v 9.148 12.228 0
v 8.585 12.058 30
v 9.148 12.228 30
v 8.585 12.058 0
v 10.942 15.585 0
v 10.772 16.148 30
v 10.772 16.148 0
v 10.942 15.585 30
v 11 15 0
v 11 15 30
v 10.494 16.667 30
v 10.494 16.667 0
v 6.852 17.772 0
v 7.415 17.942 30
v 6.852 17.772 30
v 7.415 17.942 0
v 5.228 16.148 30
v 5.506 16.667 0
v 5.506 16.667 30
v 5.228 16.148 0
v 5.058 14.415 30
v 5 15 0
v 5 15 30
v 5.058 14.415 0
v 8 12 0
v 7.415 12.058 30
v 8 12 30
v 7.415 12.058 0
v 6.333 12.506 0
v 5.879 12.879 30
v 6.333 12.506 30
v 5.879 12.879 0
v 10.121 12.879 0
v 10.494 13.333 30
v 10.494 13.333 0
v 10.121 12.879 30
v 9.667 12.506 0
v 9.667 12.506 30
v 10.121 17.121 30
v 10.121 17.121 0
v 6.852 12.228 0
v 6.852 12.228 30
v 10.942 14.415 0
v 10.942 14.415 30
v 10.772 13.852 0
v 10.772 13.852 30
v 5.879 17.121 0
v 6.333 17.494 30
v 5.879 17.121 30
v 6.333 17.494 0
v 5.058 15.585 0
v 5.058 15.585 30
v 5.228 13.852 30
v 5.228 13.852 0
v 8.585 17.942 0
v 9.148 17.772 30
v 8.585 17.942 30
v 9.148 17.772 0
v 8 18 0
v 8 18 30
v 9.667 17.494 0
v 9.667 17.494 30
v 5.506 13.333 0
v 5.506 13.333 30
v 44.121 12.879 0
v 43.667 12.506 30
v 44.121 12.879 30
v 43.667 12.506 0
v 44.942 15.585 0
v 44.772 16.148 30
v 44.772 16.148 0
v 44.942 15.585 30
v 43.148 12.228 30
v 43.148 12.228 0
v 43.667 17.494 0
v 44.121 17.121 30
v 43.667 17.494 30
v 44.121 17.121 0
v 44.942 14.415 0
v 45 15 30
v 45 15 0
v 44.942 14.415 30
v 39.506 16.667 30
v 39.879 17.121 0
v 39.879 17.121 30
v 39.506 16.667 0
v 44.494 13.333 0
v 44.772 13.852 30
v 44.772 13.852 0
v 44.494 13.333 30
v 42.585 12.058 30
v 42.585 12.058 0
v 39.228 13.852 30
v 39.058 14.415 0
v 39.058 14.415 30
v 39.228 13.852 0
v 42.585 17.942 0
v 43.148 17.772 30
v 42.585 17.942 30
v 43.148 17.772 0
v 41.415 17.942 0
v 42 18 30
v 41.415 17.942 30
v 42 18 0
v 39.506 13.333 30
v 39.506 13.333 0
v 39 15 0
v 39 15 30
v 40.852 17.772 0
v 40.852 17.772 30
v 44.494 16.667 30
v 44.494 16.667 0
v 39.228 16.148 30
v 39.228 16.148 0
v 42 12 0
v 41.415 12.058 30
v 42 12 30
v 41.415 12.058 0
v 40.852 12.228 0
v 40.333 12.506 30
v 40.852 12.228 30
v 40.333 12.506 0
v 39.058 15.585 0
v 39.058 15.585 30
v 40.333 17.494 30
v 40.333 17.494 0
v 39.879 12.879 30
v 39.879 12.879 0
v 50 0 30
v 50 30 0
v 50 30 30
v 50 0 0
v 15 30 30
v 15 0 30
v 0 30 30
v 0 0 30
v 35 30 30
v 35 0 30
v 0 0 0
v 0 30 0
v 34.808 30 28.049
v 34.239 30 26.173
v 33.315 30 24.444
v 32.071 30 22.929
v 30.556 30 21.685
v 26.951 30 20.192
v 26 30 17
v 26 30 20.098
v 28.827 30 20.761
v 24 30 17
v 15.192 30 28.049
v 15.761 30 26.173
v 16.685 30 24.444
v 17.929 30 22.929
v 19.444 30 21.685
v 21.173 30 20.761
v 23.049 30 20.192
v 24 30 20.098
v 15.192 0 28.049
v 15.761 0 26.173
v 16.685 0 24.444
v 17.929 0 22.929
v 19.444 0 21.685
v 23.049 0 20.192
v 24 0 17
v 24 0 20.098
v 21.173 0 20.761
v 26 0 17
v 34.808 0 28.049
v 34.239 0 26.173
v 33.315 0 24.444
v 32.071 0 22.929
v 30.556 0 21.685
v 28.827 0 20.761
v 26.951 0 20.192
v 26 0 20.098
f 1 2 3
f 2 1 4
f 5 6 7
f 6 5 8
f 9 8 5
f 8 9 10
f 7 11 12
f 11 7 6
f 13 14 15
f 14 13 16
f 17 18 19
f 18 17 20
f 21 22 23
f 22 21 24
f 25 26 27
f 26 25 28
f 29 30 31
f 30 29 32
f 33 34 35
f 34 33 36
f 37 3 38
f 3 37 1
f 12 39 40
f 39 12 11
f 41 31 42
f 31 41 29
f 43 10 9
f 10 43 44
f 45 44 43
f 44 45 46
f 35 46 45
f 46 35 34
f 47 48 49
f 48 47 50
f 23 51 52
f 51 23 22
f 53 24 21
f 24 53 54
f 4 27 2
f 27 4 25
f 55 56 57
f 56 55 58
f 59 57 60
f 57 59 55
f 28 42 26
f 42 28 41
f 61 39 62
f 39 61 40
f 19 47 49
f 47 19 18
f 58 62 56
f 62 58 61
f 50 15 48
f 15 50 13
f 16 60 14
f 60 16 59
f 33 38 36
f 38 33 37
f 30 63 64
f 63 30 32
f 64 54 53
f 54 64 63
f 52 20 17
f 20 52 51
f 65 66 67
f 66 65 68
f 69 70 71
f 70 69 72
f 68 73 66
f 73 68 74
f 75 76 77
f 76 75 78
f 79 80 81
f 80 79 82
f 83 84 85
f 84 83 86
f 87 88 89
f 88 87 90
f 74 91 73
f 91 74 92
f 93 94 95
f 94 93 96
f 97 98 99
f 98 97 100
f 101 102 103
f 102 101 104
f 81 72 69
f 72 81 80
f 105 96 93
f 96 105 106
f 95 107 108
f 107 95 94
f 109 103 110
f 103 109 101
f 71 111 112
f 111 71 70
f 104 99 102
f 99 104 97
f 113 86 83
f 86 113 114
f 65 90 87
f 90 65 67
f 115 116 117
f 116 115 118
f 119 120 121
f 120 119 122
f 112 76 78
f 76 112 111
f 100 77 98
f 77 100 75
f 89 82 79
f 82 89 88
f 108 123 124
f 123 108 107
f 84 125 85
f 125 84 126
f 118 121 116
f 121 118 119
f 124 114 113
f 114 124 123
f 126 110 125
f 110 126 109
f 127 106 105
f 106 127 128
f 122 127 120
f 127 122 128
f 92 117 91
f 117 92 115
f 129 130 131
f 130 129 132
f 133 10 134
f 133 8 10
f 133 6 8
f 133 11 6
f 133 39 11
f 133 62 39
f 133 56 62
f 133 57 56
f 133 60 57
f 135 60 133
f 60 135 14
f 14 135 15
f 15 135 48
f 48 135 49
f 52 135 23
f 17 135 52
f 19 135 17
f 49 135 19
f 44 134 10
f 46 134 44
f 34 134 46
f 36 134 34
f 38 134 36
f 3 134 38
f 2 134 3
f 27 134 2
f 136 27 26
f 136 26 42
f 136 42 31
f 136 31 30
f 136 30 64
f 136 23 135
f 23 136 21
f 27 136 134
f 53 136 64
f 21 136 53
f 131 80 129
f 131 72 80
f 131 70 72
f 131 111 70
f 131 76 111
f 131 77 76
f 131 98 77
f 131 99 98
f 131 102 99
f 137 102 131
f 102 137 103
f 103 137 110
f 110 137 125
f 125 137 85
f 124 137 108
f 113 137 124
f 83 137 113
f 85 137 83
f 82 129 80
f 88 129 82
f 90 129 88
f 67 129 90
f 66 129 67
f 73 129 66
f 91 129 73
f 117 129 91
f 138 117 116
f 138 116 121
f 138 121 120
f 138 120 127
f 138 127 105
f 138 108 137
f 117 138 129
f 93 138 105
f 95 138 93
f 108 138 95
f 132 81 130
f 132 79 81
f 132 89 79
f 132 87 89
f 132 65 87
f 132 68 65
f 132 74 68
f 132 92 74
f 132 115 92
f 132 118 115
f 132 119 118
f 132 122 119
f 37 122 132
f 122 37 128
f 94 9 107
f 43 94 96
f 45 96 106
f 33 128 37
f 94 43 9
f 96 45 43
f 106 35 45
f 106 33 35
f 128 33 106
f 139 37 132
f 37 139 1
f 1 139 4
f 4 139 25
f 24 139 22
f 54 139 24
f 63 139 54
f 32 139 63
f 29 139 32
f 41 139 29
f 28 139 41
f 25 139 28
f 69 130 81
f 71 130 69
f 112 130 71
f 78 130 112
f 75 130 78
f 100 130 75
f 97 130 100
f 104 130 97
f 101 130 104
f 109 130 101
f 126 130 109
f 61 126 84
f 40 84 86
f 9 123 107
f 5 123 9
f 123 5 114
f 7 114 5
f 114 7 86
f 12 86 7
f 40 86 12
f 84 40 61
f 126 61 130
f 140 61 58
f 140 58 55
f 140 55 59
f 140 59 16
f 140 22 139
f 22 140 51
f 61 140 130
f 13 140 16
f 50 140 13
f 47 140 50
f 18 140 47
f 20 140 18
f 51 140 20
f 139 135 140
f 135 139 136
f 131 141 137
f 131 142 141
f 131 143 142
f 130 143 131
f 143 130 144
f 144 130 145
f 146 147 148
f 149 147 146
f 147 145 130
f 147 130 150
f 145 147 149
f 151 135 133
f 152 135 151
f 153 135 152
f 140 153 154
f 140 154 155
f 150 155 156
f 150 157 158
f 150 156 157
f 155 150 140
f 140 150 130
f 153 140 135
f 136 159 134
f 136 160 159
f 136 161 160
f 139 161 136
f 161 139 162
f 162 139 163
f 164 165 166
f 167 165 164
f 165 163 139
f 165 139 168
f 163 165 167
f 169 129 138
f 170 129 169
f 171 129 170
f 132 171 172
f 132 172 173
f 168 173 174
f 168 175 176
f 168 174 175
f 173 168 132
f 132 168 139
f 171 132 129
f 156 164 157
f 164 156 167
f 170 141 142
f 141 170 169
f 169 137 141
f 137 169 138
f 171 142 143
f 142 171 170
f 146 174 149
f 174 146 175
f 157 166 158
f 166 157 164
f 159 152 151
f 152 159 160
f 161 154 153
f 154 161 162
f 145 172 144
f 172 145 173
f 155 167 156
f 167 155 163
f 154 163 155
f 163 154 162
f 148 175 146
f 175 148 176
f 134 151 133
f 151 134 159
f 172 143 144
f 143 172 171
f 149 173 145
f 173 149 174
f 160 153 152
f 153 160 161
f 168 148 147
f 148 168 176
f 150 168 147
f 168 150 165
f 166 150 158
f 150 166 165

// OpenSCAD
$fn = 32;

// ----------------------------------------------------------------------
// Saddle clamp: split shaft clamp
// ----------------------------------------------------------------------

// --- parameters (mm) ---
blk_l = 50;               // block length, X
blk_w = 30;               // block width, Y
blk_h = 30;               // block height
clamp_r = 10;             // shaft groove radius
hole_r = 3;               // bolt hole radius
hole_m = 8;               // bolt hole margin from the ends
saw_w = 2;                // saw kerf width

saw_depth = clamp_r + 3;  // saw kerf depth

difference() {
  cube([blk_l, blk_w, blk_h]);
  translate([blk_l / 2, -1, blk_h])
    rotate([-90, 0, 0])
      cylinder(h = blk_w + 2, r = clamp_r);
  for (sx = [0, 1])
    translate([sx ? blk_l - hole_m : hole_m, blk_w / 2, -1])
      cylinder(r = hole_r, h = blk_h + 2);
  translate([blk_l / 2 - saw_w / 2, -1, blk_h - saw_depth])
    cube([saw_w, blk_w + 2, saw_depth + 1]);
}
